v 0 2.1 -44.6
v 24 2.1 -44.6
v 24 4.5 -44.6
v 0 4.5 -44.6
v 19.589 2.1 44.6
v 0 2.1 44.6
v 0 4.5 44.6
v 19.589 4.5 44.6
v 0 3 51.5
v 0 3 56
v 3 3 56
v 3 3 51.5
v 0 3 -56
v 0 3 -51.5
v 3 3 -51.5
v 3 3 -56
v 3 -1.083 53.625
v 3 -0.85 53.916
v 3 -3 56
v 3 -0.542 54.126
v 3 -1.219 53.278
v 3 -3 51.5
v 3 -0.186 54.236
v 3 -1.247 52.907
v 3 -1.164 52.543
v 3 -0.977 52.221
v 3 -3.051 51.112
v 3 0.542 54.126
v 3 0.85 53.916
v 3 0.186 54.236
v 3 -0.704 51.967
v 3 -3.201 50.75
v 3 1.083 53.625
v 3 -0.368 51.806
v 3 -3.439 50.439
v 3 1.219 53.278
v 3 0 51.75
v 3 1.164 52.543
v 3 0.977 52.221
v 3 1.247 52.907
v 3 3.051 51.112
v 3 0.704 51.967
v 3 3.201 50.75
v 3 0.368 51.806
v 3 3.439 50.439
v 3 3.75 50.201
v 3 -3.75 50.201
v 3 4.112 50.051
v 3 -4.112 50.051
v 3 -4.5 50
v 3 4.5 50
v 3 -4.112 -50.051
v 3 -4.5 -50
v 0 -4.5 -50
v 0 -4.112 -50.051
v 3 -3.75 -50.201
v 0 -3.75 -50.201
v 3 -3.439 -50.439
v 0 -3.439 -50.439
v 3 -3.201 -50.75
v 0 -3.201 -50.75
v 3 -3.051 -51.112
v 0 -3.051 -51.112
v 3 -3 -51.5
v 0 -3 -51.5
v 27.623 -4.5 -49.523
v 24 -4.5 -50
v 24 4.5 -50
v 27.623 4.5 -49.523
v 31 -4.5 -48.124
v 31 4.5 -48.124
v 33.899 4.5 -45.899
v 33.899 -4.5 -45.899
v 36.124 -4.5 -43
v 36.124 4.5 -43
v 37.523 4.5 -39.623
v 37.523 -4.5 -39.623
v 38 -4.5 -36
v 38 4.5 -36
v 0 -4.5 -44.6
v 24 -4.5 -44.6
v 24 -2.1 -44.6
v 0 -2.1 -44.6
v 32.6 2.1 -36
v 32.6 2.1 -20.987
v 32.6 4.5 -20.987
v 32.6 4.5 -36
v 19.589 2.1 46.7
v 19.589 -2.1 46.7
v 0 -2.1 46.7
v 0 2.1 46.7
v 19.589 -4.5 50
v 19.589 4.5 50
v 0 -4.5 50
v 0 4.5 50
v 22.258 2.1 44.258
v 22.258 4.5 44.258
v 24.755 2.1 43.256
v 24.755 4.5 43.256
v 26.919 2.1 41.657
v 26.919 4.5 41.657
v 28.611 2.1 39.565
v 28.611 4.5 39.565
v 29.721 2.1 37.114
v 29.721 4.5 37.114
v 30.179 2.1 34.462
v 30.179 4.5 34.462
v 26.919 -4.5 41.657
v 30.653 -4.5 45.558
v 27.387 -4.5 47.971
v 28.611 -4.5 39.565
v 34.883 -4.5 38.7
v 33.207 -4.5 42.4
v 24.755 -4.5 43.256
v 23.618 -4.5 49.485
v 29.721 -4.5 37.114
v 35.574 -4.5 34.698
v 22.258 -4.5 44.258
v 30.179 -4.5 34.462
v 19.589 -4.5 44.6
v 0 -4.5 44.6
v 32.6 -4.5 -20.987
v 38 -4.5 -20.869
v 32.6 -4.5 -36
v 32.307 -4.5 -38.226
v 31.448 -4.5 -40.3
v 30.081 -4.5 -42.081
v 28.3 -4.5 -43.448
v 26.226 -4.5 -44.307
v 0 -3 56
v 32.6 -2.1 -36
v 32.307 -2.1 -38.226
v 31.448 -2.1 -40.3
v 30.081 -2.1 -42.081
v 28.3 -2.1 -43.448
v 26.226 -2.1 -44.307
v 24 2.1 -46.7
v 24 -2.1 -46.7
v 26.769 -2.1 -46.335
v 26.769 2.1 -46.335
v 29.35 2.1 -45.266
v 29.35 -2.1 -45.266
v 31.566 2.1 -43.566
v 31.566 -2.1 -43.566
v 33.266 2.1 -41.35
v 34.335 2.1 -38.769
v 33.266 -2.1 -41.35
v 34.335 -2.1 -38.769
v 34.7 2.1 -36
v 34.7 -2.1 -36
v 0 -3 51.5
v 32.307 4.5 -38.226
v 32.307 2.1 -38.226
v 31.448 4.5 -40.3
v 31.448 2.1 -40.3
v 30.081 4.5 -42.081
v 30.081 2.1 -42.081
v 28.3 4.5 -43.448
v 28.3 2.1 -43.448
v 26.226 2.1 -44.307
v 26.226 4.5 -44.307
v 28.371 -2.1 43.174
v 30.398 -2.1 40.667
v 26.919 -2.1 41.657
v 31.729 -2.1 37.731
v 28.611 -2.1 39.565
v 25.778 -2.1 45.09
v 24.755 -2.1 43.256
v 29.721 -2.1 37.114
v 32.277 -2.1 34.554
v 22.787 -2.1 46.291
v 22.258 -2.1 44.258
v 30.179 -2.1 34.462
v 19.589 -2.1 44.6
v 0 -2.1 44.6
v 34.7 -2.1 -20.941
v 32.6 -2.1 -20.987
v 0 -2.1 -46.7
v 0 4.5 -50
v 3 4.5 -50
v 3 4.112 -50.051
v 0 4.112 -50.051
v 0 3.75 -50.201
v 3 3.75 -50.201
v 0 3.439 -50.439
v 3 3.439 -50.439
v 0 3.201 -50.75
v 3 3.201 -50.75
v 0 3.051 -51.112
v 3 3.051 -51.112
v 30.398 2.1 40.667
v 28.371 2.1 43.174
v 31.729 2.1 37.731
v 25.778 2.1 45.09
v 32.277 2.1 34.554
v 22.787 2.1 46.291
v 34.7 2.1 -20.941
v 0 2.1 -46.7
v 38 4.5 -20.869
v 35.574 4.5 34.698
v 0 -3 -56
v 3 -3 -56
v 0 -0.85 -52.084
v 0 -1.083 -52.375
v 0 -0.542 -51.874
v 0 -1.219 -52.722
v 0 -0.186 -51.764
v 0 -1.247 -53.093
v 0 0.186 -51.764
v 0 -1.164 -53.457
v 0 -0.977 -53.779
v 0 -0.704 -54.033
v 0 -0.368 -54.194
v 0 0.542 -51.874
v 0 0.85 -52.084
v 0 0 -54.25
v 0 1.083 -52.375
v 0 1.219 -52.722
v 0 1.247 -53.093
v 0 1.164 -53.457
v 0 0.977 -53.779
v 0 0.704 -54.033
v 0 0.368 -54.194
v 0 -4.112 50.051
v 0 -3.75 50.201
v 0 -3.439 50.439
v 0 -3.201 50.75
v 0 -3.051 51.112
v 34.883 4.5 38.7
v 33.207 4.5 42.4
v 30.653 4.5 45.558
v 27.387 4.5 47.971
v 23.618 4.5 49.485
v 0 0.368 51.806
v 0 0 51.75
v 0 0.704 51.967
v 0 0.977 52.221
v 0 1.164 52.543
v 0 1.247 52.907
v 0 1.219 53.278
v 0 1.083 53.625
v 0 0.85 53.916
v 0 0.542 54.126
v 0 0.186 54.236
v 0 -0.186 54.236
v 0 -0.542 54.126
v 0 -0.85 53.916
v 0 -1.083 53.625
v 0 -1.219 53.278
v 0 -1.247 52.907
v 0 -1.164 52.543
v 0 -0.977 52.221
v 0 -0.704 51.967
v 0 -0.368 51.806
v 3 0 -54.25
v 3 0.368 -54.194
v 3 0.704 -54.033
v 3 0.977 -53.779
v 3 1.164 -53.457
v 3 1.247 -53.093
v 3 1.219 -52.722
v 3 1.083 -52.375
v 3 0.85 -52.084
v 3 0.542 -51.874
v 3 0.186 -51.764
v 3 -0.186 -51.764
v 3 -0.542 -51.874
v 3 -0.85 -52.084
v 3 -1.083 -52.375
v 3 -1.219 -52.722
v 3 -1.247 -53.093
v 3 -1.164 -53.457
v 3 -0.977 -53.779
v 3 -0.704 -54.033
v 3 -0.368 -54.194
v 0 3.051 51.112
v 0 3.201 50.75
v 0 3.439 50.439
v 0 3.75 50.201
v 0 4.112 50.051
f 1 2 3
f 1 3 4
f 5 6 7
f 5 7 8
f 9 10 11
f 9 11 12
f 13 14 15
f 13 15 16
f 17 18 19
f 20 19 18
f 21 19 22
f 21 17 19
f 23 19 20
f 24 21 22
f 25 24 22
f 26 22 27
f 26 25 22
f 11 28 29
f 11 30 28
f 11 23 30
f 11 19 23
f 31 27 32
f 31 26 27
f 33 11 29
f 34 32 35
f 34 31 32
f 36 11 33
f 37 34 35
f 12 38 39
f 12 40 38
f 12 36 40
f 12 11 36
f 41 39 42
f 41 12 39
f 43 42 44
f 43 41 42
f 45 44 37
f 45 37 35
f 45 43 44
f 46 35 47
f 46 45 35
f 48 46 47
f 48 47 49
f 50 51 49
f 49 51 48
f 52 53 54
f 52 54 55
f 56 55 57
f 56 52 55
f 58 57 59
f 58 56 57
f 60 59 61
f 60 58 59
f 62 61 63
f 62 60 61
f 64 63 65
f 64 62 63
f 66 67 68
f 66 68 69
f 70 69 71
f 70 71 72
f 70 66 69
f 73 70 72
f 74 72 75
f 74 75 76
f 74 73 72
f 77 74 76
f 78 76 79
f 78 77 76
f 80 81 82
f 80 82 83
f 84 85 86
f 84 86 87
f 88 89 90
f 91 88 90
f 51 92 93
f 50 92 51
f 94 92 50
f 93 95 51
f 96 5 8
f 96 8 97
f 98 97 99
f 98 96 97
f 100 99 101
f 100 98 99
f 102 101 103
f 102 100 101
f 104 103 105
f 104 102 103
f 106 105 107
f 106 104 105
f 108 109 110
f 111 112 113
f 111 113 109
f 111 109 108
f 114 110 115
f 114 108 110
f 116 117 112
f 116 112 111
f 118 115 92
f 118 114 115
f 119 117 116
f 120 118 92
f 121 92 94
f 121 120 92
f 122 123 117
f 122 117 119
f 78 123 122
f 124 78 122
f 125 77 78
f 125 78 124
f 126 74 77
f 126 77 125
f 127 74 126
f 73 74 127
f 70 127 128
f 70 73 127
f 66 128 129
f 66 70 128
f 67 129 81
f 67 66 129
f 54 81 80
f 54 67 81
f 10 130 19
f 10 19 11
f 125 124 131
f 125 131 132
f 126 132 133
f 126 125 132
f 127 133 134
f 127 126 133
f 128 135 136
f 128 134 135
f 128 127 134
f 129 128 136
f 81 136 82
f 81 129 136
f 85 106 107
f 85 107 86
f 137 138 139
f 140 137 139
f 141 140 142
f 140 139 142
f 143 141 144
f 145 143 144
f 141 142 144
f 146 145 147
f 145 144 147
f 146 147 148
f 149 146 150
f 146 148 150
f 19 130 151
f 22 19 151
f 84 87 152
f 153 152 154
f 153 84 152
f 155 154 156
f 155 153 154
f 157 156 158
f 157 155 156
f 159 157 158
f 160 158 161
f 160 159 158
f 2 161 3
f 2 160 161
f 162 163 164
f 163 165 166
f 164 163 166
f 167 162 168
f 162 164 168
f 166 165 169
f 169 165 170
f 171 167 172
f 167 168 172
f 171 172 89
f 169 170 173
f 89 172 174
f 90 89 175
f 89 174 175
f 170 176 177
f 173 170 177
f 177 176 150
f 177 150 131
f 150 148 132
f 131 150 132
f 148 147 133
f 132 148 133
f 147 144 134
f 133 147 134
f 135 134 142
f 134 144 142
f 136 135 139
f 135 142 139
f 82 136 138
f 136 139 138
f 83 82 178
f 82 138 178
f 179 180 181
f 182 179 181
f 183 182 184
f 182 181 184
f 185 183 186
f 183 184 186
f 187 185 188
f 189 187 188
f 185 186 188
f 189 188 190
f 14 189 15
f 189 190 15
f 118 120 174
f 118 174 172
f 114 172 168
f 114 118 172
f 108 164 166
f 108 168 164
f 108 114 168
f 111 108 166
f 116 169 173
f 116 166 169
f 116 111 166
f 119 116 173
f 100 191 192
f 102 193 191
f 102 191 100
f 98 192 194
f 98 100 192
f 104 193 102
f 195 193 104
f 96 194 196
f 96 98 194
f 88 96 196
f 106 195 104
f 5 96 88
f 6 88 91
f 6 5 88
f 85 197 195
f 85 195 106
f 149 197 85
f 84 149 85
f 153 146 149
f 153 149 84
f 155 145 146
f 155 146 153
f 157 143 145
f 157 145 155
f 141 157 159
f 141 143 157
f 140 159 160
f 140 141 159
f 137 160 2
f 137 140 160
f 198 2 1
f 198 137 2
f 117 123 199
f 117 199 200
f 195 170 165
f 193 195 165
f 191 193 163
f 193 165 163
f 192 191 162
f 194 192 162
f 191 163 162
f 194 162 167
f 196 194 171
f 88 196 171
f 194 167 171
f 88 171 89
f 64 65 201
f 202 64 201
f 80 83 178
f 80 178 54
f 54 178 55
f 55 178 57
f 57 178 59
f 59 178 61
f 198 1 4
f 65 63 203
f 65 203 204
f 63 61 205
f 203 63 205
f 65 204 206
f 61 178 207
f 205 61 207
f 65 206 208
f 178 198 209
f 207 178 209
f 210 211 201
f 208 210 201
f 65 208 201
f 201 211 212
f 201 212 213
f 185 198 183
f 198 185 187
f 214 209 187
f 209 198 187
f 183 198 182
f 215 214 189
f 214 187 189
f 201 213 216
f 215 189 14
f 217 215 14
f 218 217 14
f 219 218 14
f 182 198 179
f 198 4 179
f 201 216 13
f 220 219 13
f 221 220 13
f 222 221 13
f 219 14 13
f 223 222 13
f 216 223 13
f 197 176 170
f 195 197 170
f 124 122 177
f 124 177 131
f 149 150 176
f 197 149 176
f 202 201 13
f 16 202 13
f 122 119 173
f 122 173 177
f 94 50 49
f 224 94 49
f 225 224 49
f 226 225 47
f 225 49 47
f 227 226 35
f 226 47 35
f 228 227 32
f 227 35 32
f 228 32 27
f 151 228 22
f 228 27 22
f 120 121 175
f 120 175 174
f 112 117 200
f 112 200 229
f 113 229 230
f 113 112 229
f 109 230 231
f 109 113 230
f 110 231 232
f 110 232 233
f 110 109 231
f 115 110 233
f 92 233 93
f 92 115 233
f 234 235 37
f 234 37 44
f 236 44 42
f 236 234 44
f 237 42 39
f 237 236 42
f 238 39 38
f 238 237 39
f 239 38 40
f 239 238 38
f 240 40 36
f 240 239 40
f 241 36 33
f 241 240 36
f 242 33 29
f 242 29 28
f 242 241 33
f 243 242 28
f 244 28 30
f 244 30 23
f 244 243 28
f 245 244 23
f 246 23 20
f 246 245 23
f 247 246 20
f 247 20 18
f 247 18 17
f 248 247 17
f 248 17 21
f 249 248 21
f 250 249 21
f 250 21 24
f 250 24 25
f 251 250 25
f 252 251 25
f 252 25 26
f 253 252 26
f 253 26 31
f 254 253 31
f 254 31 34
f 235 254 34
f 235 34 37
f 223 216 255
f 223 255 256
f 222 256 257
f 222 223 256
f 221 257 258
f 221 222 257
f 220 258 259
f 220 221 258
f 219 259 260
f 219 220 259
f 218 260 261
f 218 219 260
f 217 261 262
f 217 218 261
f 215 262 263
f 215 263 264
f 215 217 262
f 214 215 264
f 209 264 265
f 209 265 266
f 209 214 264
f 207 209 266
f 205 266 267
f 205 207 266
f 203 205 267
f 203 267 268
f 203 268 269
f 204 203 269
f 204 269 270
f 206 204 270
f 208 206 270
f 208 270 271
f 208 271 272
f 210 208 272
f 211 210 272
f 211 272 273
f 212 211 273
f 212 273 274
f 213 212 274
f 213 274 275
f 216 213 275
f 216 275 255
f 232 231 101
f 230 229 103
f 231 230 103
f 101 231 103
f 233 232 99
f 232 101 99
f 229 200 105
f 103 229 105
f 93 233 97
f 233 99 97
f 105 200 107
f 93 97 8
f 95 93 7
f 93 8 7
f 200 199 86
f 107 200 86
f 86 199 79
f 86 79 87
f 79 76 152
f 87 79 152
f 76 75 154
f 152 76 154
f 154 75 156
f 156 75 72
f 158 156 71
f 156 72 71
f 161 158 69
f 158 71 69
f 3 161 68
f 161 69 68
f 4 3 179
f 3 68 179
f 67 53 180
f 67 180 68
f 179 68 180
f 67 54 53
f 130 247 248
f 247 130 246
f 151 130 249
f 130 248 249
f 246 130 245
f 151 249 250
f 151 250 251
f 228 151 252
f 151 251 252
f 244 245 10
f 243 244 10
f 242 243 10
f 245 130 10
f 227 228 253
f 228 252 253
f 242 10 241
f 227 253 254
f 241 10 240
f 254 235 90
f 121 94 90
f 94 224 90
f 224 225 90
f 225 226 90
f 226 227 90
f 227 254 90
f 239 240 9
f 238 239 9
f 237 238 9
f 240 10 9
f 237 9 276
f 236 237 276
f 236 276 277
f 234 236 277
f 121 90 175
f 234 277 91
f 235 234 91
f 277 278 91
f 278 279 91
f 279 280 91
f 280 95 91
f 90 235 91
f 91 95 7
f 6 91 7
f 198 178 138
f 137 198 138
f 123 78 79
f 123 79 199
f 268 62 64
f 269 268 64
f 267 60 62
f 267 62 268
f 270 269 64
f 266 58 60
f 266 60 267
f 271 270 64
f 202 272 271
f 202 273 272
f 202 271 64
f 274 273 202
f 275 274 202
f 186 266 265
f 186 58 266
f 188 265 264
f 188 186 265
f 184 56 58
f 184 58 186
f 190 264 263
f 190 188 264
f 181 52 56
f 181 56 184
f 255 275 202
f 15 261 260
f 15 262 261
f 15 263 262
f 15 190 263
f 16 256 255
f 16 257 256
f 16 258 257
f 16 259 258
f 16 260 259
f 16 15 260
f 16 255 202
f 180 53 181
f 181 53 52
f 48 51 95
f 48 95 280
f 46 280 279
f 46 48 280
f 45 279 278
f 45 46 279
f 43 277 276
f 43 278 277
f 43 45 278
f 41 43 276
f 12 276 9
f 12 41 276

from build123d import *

# Parameters (mm, degrees)
BOSS_EXTRUDE1_DEPTH      = 4.5
BOSS_EXTRUDE1_DEPTH_BACK = 4.5
CUT_EXTRUDE1_DEPTH       = 2.1
CUT_EXTRUDE1_DEPTH_BACK  = 2.1
BOSS_EXTRUDE2_DEPTH      = 3
BOSS_EXTRUDE2_DEPTH_BACK = 3
SKETCH2_W                = 6
SKETCH2_H                = 6
SKETCH2_R                = 1.25
FILLET2_R                = 1.5
SKETCH5_W                = 120
SKETCH5_H                = 30
CUT_EXTRUDE2_DEPTH       = 68.825142831


with BuildPart() as part:
    # Sketch1 → Boss-Extrude1 (new, two sides: drawn at the far end of the back side and taken through both)
    # profile 1 of 2: a face of its own
    with BuildSketch(Plane(origin=(0, 0, 0), x_dir=(1, 0, 0), z_dir=(0, 1, 0)).offset(-BOSS_EXTRUDE1_DEPTH_BACK)):
        with BuildLine():
            Line((-24, 50), (24, 50))
            ThreePointArc((24, 50), (33.899494937, 45.899494937), (38, 36))
            Line((38, 36), (38, 20.869079534))
            Line((38, 20.869079534), (35.573892834, -34.697910198))
            ThreePointArc((35.573892834, -34.697910198), (30.653330181, -45.557823393), (19.589121288, -50))
            Line((19.589121288, -50), (-19.589121288, -50))
            ThreePointArc((-19.589121288, -50), (-30.653330181, -45.557823393), (-35.573892834, -34.697910198))
            Line((-35.573892834, -34.697910198), (-38, 20.869079534))
            Line((-38, 20.869079534), (-38, 36))
            ThreePointArc((-38, 36), (-33.899494937, 45.899494937), (-24, 50))
        make_face()
        with BuildLine():
            ThreePointArc((-24, 46.7), (-31.566042559, 43.566042559), (-34.7, 36))
            Line((-34.7, 36), (-34.7, 20.94108579))
            Line((-34.7, 20.94108579), (-32.277033702, -34.55396622))
            ThreePointArc((-32.277033702, -34.55396622), (-28.371337097, -43.174022318), (-19.589121288, -46.7))
            Line((-19.589121288, -46.7), (19.589121288, -46.7))
            ThreePointArc((19.589121288, -46.7), (28.371337097, -43.174022318), (32.277033702, -34.55396622))
            Line((32.277033702, -34.55396622), (34.7, 20.94108579))
            Line((34.7, 20.94108579), (34.7, 36))
            ThreePointArc((34.7, 36), (31.566042559, 43.566042559), (24, 46.7))
            Line((24, 46.7), (-24, 46.7))
        make_face(mode=Mode.SUBTRACT)
    # profile 2 of 2: a face of its own
    with BuildSketch(Plane(origin=(0, 0, 0), x_dir=(1, 0, 0), z_dir=(0, 1, 0)).offset(-BOSS_EXTRUDE1_DEPTH_BACK)):
        with BuildLine():
            Line((-24, 46.7), (24, 46.7))
            ThreePointArc((24, 46.7), (31.566042559, 43.566042559), (34.7, 36))
            Line((34.7, 36), (34.7, 20.94108579))
            Line((34.7, 20.94108579), (32.277033702, -34.55396622))
            ThreePointArc((32.277033702, -34.55396622), (28.371337097, -43.174022318), (19.589121288, -46.7))
            Line((19.589121288, -46.7), (-19.589121288, -46.7))
            ThreePointArc((-19.589121288, -46.7), (-28.371337097, -43.174022318), (-32.277033702, -34.55396622))
            Line((-32.277033702, -34.55396622), (-34.7, 20.94108579))
            Line((-34.7, 20.94108579), (-34.7, 36))
            ThreePointArc((-34.7, 36), (-31.566042559, 43.566042559), (-24, 46.7))
        make_face()
        with BuildLine():
            ThreePointArc((-24, 44.6), (-30.081118318, 42.081118318), (-32.6, 36))
            Line((-32.6, 36), (-32.6, 20.986907953))
            Line((-32.6, 20.986907953), (-30.179032437, -34.462365506))
            ThreePointArc((-30.179032437, -34.462365506), (-26.91915968, -41.657057998), (-19.589121288, -44.6))
            Line((-19.589121288, -44.6), (19.589121288, -44.6))
            ThreePointArc((19.589121288, -44.6), (26.91915968, -41.657057998), (30.179032437, -34.462365506))
            Line((30.179032437, -34.462365506), (32.6, 20.986907953))
            Line((32.6, 20.986907953), (32.6, 36))
            ThreePointArc((32.6, 36), (30.081118318, 42.081118318), (24, 44.6))
            Line((24, 44.6), (-24, 44.6))
        make_face(mode=Mode.SUBTRACT)
    extrude(amount=BOSS_EXTRUDE1_DEPTH + BOSS_EXTRUDE1_DEPTH_BACK)

    # Sketch1<3> → Cut-Extrude1 (cut, two sides: drawn at the far end of the back side and taken through both)
    with BuildSketch(Plane(origin=(0, 0, 0), x_dir=(1, 0, 0), z_dir=(0, 1, 0)).offset(-CUT_EXTRUDE1_DEPTH_BACK)):
        with BuildLine():
            Line((-24, 46.7), (24, 46.7))
            ThreePointArc((24, 46.7), (31.566042559, 43.566042559), (34.7, 36))
            Line((34.7, 36), (34.7, 20.94108579))
            Line((34.7, 20.94108579), (32.277033702, -34.55396622))
            ThreePointArc((32.277033702, -34.55396622), (28.371337097, -43.174022318), (19.589121288, -46.7))
            Line((19.589121288, -46.7), (-19.589121288, -46.7))
            ThreePointArc((-19.589121288, -46.7), (-28.371337097, -43.174022318), (-32.277033702, -34.55396622))
            Line((-32.277033702, -34.55396622), (-34.7, 20.94108579))
            Line((-34.7, 20.94108579), (-34.7, 36))
            ThreePointArc((-34.7, 36), (-31.566042559, 43.566042559), (-24, 46.7))
        make_face()
        with BuildLine():
            Line((-32, 36), (-32, 21))
            Line((-32, 21), (-29.579603504, -34.436193874))
            ThreePointArc((-29.579603504, -34.436193874), (-26.504251846, -41.223639621), (-19.589121288, -44))
            Line((-19.589121288, -44), (19.589121288, -44))
            ThreePointArc((19.589121288, -44), (26.504251846, -41.223639621), (29.579603504, -34.436193874))
            Line((29.579603504, -34.436193874), (32, 21))
            Line((32, 21), (32, 36))
            ThreePointArc((32, 36), (29.656854249, 41.656854249), (24, 44))
            Line((24, 44), (-24, 44))
            ThreePointArc((-24, 44), (-29.656854249, 41.656854249), (-32, 36))
        make_face(mode=Mode.SUBTRACT)
    extrude(amount=CUT_EXTRUDE1_DEPTH + CUT_EXTRUDE1_DEPTH_BACK, mode=Mode.SUBTRACT)

    # Sketch2 → Boss-Extrude2 (add, two sides: drawn at the far end of the back side and taken through both)
    # profile 1 of 2: a face of its own
    with BuildSketch(Plane(origin=(0, 0, 0), x_dir=(0, 0, -1), z_dir=(1, 0, 0)).offset(-BOSS_EXTRUDE2_DEPTH_BACK)):
        with Locations((-53, 0)):
            Rectangle(SKETCH2_W, SKETCH2_H)
        with Locations((-53, 0)):
            Circle(SKETCH2_R, mode=Mode.SUBTRACT)
    # profile 2 of 2: a face of its own
    with BuildSketch(Plane(origin=(0, 0, 0), x_dir=(0, 0, -1), z_dir=(1, 0, 0)).offset(-BOSS_EXTRUDE2_DEPTH_BACK)):
        with Locations((53, 0)):
            Rectangle(SKETCH2_W, SKETCH2_H)
        with Locations((53, 0)):
            Circle(SKETCH2_R, mode=Mode.SUBTRACT)
    extrude(amount=BOSS_EXTRUDE2_DEPTH + BOSS_EXTRUDE2_DEPTH_BACK)

    # Fillet2
    fillet2_edges = [part.edges().sort_by_distance(p)[0] for p in [
        (0, 3, 50),
        (0, -3, 50),
        (0, -3, -50),
        (0, 3, -50),
    ]]
    fillet(fillet2_edges, radius=FILLET2_R - 0.0001)  # a hair under: the kernel refuses the full size

    # Sketch5 → Cut-Extrude2 (cut, through all)
    with BuildSketch(Plane(origin=(0, 0, 0), x_dir=(0, 0, -1), z_dir=(1, 0, 0))):
        Rectangle(SKETCH5_W, SKETCH5_H)
    extrude(amount=-CUT_EXTRUDE2_DEPTH, mode=Mode.SUBTRACT)


solid = part.part
